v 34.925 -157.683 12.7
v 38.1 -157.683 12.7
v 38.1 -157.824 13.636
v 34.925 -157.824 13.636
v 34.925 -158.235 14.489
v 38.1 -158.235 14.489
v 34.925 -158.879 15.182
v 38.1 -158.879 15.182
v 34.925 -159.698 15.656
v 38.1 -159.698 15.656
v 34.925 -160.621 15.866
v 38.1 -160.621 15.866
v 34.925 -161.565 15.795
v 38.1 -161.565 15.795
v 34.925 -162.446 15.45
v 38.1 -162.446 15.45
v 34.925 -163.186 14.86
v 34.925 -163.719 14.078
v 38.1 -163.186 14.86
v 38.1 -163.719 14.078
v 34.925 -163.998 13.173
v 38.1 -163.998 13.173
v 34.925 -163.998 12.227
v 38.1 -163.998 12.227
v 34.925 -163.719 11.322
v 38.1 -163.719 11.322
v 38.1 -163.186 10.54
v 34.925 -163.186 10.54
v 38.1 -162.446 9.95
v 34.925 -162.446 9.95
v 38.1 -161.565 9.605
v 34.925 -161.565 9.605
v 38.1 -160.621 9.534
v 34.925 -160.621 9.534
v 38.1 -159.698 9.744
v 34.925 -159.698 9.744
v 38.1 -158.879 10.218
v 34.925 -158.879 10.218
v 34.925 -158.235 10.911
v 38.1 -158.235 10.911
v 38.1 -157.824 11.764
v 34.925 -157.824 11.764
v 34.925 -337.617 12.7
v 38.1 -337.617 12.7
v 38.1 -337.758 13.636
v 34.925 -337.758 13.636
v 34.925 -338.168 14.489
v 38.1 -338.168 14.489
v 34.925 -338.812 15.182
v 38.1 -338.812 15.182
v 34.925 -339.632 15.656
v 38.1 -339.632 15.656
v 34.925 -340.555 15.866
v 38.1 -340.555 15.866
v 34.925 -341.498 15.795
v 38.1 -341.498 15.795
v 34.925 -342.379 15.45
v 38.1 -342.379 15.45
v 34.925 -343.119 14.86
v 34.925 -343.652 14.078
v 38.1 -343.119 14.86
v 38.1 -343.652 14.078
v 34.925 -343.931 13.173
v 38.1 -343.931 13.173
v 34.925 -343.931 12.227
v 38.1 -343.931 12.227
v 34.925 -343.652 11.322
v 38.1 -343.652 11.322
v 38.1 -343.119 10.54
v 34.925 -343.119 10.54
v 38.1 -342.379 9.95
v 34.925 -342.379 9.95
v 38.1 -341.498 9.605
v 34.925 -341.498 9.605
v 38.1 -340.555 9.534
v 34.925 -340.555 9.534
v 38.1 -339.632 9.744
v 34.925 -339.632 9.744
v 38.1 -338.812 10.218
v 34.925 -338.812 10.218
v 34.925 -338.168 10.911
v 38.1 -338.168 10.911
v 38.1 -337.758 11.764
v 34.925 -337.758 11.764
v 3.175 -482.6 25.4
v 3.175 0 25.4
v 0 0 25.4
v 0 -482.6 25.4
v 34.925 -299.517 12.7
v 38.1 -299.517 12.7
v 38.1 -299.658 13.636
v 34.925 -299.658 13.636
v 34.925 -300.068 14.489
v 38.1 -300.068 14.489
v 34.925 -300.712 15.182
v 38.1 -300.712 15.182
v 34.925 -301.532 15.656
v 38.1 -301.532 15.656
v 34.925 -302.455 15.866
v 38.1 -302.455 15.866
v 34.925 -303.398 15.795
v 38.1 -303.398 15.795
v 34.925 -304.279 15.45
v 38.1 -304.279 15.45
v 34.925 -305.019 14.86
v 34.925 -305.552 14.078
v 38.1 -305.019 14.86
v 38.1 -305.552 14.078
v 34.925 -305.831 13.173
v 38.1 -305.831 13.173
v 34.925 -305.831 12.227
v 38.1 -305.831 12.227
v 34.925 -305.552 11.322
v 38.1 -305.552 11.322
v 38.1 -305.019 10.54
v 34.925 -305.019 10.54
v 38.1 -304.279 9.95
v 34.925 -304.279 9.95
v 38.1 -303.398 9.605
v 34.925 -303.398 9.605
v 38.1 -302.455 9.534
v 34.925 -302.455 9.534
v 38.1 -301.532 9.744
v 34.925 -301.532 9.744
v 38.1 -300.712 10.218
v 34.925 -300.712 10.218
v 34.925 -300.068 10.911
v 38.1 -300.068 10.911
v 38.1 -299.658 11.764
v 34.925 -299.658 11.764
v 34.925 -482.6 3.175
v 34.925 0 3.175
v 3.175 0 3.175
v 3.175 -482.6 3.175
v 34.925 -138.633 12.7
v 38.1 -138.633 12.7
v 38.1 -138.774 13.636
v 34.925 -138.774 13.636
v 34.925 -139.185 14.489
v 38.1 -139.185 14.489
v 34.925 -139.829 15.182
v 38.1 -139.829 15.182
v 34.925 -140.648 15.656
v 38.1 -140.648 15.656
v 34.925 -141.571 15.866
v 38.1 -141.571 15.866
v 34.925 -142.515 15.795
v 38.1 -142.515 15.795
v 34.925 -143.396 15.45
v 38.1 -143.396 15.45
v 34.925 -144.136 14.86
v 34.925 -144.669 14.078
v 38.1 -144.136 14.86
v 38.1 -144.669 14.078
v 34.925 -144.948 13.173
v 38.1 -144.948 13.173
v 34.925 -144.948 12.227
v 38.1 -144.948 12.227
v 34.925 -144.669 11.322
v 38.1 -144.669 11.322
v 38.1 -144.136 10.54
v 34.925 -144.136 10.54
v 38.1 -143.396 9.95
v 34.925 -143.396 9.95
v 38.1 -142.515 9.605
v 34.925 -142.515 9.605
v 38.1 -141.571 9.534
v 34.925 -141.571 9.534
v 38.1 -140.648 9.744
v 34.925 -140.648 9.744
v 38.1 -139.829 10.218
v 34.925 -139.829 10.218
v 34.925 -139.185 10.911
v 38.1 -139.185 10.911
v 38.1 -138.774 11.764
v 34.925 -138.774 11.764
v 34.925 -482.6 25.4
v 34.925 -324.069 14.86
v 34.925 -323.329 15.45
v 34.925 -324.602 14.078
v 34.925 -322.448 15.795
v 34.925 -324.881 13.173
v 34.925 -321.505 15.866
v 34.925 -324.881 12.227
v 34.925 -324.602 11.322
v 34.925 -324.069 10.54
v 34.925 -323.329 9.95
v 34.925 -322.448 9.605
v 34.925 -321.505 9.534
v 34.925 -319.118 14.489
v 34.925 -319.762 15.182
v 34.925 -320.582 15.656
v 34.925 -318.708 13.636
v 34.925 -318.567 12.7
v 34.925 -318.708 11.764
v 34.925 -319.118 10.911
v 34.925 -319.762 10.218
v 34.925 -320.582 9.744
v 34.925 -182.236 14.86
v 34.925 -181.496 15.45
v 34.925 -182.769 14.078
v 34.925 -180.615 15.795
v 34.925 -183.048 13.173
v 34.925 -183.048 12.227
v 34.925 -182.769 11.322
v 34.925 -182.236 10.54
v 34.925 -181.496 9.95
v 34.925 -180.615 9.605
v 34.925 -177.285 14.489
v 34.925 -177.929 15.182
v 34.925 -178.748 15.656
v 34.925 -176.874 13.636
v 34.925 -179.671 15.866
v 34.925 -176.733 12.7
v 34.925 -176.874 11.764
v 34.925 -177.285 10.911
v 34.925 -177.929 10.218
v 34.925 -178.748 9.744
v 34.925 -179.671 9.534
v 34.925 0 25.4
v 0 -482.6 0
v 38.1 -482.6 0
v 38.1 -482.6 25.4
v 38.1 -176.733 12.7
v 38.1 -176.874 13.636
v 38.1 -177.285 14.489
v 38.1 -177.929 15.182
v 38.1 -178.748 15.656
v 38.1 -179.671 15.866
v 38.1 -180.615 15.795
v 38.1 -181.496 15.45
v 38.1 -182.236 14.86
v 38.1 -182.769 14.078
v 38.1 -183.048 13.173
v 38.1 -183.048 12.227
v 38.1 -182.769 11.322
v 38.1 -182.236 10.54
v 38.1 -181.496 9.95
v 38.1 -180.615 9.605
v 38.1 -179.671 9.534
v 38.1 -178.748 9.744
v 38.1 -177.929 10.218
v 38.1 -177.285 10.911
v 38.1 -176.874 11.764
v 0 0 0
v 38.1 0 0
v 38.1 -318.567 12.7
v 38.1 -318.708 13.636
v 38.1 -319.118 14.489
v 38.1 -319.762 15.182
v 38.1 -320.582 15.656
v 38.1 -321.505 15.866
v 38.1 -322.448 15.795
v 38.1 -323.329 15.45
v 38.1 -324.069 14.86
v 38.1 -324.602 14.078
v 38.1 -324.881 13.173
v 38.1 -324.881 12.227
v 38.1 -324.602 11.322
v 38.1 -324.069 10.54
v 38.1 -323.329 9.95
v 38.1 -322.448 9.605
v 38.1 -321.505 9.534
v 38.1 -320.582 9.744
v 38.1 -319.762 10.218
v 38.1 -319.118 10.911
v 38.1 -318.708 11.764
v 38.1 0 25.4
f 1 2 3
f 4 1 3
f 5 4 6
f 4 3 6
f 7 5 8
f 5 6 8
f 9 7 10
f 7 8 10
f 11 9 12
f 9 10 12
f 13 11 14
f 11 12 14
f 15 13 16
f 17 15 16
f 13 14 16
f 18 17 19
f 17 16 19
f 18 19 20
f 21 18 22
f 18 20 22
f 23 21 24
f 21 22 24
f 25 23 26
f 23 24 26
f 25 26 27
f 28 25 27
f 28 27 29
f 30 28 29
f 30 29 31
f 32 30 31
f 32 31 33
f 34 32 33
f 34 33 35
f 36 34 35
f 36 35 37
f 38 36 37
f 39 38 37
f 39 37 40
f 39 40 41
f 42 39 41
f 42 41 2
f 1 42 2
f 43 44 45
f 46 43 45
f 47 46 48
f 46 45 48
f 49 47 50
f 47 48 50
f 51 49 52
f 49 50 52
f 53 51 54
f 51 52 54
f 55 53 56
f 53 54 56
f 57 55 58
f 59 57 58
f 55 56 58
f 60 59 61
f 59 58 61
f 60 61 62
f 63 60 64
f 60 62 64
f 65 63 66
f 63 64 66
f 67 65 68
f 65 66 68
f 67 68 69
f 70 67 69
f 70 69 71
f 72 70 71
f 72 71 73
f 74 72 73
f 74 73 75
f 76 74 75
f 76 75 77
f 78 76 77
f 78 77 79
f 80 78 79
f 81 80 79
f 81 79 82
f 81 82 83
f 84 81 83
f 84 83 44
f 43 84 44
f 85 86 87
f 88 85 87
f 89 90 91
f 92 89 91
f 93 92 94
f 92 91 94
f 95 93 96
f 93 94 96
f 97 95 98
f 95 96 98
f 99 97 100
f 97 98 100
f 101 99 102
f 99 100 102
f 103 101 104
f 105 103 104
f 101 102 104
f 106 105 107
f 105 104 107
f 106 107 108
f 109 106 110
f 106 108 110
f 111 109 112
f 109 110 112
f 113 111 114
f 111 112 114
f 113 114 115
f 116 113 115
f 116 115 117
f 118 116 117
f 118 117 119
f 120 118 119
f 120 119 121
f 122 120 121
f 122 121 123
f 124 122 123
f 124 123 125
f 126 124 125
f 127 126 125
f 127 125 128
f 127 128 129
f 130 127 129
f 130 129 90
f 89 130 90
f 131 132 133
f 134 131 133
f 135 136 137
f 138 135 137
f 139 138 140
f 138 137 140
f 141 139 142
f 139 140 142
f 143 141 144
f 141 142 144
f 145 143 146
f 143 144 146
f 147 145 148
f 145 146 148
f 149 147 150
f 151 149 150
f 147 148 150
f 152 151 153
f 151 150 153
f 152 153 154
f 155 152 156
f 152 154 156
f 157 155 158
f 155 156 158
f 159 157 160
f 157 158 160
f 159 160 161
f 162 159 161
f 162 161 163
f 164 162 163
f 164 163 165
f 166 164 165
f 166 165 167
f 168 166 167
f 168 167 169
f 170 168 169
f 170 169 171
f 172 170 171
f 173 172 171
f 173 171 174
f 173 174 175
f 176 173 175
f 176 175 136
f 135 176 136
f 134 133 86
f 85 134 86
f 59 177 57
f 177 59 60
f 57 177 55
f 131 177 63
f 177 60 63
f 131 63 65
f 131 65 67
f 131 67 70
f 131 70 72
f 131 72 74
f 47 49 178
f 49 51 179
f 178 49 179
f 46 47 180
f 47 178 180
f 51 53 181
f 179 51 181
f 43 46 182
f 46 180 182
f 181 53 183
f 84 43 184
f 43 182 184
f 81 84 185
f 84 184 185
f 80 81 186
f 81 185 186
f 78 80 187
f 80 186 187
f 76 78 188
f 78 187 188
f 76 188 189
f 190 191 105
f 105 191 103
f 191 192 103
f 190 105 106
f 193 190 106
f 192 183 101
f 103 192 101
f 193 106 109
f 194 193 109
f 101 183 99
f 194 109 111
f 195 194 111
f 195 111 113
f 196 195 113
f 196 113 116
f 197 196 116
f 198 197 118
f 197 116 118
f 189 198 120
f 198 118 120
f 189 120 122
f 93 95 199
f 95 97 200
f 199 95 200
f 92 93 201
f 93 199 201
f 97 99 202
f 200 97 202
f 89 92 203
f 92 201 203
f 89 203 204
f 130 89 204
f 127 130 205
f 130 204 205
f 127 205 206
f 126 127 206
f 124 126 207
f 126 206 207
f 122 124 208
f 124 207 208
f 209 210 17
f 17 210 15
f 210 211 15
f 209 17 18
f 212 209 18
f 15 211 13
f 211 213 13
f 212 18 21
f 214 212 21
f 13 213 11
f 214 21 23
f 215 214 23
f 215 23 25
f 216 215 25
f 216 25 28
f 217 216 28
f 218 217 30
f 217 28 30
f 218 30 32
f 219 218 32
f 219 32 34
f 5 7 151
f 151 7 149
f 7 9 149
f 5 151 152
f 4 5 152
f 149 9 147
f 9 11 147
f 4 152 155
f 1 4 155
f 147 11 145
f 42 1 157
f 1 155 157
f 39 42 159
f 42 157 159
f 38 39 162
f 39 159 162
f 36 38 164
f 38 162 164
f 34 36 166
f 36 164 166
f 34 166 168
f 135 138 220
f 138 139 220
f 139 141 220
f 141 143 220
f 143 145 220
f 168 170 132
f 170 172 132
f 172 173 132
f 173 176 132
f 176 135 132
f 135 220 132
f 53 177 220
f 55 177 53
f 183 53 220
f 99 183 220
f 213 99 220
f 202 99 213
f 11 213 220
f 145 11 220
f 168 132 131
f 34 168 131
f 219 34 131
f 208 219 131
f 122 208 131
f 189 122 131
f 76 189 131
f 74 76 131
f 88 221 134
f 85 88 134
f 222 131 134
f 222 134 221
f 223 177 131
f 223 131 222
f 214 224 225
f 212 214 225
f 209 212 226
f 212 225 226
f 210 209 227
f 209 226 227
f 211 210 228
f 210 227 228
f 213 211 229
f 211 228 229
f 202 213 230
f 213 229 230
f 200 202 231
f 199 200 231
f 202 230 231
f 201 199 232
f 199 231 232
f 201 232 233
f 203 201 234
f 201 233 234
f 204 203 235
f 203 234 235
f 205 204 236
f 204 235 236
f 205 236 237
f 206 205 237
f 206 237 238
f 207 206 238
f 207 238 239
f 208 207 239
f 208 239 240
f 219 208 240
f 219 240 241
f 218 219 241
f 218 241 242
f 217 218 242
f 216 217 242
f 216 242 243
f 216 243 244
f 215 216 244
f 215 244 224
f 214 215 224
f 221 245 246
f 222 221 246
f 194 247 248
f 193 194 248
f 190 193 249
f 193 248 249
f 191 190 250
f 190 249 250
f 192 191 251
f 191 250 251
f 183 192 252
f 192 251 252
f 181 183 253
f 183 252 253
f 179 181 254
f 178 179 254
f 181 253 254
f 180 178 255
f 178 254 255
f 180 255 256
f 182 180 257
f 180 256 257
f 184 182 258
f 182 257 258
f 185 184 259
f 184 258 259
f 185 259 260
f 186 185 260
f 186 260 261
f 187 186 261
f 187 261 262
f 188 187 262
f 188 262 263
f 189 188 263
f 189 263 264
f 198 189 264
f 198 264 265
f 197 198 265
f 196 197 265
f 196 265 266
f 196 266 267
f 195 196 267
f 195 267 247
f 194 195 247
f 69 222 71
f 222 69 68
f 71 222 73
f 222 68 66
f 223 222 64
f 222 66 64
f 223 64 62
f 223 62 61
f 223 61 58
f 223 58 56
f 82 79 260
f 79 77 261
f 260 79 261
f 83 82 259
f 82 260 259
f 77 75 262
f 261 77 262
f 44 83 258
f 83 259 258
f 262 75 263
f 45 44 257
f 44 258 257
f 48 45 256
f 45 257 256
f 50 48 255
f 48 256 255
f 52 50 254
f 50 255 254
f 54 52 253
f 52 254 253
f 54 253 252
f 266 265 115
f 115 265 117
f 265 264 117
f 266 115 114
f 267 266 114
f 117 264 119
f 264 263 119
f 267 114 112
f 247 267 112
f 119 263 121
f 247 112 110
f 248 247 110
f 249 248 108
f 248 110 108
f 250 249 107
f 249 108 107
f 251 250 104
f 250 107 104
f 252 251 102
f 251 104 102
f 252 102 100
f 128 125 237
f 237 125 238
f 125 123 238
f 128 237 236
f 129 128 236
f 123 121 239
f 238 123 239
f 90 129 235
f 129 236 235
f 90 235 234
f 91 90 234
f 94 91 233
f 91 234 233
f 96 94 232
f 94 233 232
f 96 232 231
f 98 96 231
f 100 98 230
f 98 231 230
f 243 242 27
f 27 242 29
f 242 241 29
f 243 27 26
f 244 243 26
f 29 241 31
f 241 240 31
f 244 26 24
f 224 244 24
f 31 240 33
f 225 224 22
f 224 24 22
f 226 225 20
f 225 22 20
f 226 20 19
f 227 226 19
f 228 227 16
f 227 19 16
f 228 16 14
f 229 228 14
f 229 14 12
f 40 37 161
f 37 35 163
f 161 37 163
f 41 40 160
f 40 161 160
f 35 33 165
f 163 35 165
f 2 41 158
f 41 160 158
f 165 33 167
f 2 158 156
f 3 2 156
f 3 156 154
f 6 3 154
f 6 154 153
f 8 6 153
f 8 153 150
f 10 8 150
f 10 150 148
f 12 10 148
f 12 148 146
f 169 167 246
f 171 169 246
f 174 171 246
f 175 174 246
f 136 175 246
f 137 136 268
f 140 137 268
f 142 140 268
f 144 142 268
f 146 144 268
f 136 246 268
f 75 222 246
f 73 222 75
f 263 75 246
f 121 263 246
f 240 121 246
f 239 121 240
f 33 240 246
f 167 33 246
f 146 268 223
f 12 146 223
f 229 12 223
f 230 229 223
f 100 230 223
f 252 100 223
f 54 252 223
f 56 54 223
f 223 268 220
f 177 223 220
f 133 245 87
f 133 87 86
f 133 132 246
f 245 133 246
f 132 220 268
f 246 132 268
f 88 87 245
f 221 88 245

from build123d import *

# Parameters (mm, degrees)
F1_DEPTH = 482.6
F2_R     = 3.175
F3_DEPTH = 6.35


with BuildPart() as f1:
    # F0 (on Front) → F1 (new body)
    with BuildSketch(Plane.XZ):
        Polygon((0, 25.4), (0, 0), (38.1, 0), (38.1, 25.4), (34.925, 25.4), (34.925, 3.175), (3.175, 3.175), (3.175, 25.4), align=None)
    extrude(amount=F1_DEPTH)

    # F2 (on face) → F3 (cut)
    with BuildSketch(Plane.YZ.offset(38.1)):
        with Locations((-141.8082, 12.7)):
            Circle(F2_R)
        with Locations((-160.8582, 12.7)):
            Circle(F2_R)
        with Locations((-179.9082, 12.7)):
            Circle(F2_R)
        with Locations((-302.6918, 12.7)):
            Circle(F2_R)
        with Locations((-321.7418, 12.7)):
            Circle(F2_R)
        with Locations((-340.7918, 12.7)):
            Circle(F2_R)
    extrude(amount=-F3_DEPTH, mode=Mode.SUBTRACT)


solid = f1.part
